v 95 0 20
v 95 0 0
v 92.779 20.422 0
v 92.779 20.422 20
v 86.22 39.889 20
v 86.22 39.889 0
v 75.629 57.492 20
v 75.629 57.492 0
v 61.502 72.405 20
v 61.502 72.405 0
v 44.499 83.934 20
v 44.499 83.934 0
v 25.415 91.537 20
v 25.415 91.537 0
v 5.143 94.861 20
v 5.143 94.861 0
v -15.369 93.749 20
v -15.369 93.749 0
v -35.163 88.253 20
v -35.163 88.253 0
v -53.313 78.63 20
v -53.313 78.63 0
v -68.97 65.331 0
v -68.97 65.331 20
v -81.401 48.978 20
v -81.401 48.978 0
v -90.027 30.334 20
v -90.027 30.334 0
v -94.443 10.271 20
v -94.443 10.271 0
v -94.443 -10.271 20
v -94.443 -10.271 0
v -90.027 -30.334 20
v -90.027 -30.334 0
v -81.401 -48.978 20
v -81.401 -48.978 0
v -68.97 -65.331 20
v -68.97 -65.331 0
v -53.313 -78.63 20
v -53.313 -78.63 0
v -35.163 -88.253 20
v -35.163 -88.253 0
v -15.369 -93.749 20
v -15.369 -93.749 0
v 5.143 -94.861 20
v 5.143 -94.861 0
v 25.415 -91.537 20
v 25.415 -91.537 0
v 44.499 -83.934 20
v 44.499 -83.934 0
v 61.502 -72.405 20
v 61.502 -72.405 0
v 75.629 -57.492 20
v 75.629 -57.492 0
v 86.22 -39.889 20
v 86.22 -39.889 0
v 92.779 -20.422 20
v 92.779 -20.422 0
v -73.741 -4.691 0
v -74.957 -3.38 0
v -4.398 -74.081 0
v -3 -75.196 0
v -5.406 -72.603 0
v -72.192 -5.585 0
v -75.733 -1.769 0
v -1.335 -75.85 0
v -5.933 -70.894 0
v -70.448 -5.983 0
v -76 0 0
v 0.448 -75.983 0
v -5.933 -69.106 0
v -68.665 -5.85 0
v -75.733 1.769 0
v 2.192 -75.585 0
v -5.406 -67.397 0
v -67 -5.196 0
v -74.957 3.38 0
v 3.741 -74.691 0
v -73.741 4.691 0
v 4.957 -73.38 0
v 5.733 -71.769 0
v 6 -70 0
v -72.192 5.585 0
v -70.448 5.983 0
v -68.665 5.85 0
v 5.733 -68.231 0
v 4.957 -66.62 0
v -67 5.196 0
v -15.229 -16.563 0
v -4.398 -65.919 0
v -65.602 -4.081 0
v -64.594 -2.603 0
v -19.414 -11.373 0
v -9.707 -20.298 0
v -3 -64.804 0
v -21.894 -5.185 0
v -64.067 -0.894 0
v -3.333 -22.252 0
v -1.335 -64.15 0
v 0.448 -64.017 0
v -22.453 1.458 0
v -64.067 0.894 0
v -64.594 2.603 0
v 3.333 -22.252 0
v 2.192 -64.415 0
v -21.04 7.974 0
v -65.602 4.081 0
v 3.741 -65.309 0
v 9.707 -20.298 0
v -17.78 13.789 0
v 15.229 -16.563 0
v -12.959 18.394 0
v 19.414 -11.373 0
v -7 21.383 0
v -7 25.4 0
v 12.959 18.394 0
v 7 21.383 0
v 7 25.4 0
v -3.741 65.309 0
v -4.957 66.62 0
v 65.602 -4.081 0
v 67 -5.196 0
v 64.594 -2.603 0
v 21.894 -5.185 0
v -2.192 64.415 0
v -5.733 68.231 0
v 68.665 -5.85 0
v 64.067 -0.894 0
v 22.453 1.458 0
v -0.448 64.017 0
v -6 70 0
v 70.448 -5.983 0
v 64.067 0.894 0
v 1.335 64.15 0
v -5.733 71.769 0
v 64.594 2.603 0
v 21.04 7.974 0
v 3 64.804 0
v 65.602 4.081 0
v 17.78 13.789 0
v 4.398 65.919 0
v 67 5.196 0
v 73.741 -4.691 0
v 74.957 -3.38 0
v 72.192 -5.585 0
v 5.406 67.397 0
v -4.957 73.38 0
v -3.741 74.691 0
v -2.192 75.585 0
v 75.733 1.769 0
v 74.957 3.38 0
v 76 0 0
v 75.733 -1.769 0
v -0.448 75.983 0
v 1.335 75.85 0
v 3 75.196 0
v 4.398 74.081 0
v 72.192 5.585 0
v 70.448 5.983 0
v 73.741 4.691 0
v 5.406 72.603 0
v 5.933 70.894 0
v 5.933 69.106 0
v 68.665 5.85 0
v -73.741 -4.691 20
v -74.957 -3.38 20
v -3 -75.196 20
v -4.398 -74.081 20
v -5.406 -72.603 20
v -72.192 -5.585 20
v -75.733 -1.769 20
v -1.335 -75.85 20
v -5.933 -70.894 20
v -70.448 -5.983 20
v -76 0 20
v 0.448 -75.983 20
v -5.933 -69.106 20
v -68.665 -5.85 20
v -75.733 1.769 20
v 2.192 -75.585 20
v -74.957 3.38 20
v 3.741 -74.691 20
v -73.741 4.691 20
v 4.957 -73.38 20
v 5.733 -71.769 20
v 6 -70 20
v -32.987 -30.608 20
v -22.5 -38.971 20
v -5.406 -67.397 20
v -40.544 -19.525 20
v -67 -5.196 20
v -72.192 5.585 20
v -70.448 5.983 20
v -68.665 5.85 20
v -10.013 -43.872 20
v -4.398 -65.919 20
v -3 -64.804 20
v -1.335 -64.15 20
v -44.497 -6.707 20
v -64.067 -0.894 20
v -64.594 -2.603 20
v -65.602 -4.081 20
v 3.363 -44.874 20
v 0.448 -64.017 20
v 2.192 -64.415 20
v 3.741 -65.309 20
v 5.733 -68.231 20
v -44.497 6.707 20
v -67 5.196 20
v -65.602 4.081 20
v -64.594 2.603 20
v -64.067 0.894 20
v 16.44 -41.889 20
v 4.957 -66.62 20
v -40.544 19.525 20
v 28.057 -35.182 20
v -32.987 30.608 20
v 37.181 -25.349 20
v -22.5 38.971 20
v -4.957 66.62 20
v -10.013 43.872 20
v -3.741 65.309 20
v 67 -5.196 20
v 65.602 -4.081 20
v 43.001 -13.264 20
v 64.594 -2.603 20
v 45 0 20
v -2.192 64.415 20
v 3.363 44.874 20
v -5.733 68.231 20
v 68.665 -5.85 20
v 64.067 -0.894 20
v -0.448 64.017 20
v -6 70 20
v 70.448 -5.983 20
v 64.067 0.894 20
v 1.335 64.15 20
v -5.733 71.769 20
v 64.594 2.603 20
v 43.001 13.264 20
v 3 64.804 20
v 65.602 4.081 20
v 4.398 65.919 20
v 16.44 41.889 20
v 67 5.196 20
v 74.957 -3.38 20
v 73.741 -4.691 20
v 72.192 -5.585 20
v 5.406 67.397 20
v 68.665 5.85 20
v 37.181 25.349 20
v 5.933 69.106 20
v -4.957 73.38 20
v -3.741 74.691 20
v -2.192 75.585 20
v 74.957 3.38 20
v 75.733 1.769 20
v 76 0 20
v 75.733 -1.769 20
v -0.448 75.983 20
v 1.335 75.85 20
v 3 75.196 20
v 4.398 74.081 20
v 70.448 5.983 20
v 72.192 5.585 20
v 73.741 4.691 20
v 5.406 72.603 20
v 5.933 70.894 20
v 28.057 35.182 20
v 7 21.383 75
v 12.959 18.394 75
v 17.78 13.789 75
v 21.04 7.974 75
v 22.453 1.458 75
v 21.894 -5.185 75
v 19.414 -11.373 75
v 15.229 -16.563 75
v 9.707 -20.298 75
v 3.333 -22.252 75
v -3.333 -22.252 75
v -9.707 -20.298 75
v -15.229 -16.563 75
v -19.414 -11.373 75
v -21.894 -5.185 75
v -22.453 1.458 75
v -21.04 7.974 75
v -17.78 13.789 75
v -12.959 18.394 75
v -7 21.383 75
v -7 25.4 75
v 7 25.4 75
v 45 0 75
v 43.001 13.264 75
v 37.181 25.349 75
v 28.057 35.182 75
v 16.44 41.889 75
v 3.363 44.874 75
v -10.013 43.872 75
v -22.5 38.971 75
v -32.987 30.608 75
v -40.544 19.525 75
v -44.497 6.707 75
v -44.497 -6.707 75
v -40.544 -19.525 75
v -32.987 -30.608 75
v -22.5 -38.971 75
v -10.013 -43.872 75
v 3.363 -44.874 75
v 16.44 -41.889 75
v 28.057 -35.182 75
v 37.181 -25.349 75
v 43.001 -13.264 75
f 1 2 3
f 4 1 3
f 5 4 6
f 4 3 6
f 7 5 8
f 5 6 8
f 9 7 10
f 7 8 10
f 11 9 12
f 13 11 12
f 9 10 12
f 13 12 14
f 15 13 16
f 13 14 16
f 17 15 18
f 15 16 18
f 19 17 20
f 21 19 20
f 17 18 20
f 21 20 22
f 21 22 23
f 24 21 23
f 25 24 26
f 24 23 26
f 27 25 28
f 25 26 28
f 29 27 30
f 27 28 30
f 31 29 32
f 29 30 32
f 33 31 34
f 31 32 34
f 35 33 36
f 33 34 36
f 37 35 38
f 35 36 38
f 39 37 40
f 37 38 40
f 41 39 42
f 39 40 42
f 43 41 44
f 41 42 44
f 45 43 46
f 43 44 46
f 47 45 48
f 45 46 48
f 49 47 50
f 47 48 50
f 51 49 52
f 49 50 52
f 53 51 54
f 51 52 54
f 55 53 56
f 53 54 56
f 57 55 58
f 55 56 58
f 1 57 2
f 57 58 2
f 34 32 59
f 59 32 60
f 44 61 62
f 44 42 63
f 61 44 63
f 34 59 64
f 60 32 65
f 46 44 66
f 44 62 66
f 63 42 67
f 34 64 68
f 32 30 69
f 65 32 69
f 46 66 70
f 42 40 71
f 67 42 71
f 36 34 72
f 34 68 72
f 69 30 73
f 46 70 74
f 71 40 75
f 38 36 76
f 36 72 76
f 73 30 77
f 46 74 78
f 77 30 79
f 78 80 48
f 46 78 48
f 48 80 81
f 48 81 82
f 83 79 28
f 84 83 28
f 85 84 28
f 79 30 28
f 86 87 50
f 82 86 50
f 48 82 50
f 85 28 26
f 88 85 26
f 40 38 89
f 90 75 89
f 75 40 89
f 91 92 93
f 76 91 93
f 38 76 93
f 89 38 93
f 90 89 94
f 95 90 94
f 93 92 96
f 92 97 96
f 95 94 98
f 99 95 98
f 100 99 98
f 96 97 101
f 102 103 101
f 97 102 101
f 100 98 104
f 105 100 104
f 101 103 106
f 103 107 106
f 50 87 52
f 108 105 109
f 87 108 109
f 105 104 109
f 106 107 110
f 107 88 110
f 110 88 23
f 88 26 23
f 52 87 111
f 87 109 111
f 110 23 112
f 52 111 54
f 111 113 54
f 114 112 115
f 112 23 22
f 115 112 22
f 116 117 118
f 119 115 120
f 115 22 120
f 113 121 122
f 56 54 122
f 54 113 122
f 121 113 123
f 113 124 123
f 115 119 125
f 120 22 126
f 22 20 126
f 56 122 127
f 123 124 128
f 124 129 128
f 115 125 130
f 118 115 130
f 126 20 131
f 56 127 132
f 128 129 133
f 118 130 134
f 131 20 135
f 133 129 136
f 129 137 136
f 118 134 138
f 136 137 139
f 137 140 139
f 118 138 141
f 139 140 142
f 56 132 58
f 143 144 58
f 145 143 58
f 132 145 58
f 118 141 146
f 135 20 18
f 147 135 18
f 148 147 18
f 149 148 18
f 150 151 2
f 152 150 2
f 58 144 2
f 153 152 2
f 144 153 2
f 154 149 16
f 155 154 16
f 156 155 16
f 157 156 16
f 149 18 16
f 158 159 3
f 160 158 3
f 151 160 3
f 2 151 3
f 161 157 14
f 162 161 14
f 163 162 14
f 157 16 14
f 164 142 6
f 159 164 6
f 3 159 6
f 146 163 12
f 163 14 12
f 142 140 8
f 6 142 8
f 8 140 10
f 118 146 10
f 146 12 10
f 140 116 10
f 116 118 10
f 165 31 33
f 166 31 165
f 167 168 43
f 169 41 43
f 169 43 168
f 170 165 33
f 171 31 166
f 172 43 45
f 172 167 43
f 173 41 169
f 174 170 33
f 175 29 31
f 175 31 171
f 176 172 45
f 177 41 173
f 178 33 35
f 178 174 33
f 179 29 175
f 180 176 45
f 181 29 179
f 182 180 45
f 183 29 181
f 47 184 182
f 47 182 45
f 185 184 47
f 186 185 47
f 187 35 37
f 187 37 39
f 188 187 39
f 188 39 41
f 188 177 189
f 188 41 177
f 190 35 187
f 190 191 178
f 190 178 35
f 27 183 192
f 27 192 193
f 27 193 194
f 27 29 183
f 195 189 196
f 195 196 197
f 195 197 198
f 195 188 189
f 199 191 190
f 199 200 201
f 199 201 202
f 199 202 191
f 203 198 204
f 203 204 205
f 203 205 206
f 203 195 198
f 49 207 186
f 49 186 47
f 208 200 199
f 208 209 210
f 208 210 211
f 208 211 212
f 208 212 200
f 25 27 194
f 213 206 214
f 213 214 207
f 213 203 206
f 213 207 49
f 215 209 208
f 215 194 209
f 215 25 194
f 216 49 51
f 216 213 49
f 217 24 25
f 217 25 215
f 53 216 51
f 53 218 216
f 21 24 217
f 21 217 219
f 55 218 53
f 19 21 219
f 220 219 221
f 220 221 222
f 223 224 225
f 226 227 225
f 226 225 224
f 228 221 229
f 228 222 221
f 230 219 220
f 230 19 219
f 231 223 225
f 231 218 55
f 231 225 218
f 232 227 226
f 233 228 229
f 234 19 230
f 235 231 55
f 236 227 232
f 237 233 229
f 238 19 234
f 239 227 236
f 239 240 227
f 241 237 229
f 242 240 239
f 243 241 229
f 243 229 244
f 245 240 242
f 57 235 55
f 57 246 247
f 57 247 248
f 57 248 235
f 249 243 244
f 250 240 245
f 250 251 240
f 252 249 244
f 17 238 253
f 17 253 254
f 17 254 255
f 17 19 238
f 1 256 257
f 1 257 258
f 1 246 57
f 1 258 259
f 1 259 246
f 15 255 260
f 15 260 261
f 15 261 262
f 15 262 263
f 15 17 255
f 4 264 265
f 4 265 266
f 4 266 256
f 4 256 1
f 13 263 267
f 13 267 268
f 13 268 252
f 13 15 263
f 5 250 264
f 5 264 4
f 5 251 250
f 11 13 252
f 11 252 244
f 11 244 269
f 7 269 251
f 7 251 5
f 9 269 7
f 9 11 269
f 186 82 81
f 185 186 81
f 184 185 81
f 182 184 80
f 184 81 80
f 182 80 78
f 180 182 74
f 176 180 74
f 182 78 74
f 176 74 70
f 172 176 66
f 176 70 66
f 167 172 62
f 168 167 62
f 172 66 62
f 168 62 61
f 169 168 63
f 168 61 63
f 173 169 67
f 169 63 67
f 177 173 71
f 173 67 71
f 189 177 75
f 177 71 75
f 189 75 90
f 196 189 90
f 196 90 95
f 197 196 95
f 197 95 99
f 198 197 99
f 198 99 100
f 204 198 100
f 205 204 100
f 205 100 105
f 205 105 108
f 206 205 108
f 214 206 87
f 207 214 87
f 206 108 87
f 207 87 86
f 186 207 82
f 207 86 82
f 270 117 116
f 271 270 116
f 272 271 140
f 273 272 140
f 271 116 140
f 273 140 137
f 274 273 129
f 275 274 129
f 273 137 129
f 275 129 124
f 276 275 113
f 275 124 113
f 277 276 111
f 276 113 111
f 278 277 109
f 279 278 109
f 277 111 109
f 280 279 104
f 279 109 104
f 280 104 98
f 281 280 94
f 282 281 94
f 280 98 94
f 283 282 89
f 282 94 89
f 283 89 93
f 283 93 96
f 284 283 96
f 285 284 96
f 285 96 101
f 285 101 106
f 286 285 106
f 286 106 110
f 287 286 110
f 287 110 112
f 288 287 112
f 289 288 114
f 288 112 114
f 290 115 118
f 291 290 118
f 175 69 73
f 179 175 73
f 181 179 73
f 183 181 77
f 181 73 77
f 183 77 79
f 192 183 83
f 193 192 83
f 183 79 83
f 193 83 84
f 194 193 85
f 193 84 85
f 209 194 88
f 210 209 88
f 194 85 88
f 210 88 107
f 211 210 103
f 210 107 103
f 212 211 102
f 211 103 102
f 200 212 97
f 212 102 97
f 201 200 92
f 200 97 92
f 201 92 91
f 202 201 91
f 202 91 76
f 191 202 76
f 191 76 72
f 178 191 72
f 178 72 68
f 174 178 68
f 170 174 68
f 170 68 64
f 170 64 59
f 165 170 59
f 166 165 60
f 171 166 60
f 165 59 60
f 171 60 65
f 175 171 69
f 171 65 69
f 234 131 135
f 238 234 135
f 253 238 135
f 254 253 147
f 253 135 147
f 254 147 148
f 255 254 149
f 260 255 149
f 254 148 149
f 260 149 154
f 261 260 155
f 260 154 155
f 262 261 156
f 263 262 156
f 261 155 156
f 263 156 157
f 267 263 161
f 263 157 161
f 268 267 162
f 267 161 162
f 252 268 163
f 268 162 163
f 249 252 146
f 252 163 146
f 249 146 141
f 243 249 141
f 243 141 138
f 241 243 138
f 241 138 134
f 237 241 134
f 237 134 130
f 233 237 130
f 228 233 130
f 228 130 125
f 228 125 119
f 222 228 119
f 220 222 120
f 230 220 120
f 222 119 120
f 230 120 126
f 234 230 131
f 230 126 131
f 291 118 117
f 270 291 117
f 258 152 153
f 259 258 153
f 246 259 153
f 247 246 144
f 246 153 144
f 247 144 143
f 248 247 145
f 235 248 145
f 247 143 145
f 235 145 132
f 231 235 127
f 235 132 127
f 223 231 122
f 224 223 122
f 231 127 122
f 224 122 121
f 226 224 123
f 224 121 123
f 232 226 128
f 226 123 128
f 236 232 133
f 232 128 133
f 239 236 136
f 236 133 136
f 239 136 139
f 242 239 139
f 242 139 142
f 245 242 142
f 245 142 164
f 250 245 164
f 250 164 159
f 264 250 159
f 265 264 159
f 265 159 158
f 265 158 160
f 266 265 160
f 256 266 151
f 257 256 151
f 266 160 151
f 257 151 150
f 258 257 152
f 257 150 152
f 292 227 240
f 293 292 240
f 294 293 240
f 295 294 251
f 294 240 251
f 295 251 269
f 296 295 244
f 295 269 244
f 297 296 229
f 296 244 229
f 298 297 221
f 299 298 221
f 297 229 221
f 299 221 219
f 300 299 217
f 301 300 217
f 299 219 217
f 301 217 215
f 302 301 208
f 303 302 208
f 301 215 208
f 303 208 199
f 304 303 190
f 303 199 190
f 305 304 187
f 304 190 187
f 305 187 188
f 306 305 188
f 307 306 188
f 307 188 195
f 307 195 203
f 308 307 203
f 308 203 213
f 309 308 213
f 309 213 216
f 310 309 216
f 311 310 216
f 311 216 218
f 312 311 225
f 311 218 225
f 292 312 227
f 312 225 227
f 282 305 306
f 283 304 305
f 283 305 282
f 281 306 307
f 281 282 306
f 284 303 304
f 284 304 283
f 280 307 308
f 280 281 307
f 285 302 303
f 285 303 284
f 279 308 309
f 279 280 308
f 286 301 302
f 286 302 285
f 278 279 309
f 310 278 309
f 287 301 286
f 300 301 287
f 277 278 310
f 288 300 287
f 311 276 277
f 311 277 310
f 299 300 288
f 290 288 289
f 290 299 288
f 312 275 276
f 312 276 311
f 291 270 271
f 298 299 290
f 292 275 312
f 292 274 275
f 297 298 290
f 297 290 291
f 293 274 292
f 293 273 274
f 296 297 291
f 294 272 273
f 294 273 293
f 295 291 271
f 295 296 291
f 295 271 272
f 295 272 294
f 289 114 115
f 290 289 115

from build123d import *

# Parameters (mm, degrees)
SKETCH1_R           = 95
BOSS_EXTRUDE1_DEPTH = 20
SKETCH2_R           = 6
CUT_EXTRUDE1_DEPTH  = 20
SKETCH5_R           = 45
BOSS_EXTRUDE3_DEPTH = 55
CUT_EXTRUDE4_DEPTH  = 75


with BuildPart() as part:
    # Sketch1 → Boss-Extrude1 (new body)
    with BuildSketch(Plane.XY):
        Circle(SKETCH1_R)
    extrude(amount=BOSS_EXTRUDE1_DEPTH)

    # Sketch2 → Cut-Extrude1 (cut)
    with BuildSketch(Plane(origin=(0, 0, 0), x_dir=(-1, 0, 0), z_dir=(0, 0, -1))):
        with Locations((0, 70)):
            Circle(SKETCH2_R)
        with Locations((70, 0)):
            Circle(SKETCH2_R)
        with Locations(Location((0, -70, 0), (0, 0, 180))):
            Circle(SKETCH2_R)
        with Locations(Location((-70, 0, 0), (0, 0, 180))):
            Circle(SKETCH2_R)
    extrude(amount=-CUT_EXTRUDE1_DEPTH, mode=Mode.SUBTRACT)

    # Sketch5 → Boss-Extrude3 (add)
    with BuildSketch(Plane.XY.offset(20)):
        Circle(SKETCH5_R)
    extrude(amount=BOSS_EXTRUDE3_DEPTH)

    # Sketch3 → Cut-Extrude4 (cut)
    with BuildSketch(Plane(origin=(0, 0, 0), x_dir=(-1, 0, 0), z_dir=(0, 0, -1))):
        with BuildLine():
            Line((-7, 22.5), (-7, 21.38340478))
            ThreePointArc((-7, 21.38340478), (0, -22.5), (7, 21.38340478))
            Line((7, 21.38340478), (7, 22.5))
            Line((7, 22.5), (7, 25.4))
            Line((7, 25.4), (-7, 25.4))
            Line((-7, 25.4), (-7, 22.5))
        make_face()
    extrude(amount=-CUT_EXTRUDE4_DEPTH, mode=Mode.SUBTRACT)


solid = part.part
